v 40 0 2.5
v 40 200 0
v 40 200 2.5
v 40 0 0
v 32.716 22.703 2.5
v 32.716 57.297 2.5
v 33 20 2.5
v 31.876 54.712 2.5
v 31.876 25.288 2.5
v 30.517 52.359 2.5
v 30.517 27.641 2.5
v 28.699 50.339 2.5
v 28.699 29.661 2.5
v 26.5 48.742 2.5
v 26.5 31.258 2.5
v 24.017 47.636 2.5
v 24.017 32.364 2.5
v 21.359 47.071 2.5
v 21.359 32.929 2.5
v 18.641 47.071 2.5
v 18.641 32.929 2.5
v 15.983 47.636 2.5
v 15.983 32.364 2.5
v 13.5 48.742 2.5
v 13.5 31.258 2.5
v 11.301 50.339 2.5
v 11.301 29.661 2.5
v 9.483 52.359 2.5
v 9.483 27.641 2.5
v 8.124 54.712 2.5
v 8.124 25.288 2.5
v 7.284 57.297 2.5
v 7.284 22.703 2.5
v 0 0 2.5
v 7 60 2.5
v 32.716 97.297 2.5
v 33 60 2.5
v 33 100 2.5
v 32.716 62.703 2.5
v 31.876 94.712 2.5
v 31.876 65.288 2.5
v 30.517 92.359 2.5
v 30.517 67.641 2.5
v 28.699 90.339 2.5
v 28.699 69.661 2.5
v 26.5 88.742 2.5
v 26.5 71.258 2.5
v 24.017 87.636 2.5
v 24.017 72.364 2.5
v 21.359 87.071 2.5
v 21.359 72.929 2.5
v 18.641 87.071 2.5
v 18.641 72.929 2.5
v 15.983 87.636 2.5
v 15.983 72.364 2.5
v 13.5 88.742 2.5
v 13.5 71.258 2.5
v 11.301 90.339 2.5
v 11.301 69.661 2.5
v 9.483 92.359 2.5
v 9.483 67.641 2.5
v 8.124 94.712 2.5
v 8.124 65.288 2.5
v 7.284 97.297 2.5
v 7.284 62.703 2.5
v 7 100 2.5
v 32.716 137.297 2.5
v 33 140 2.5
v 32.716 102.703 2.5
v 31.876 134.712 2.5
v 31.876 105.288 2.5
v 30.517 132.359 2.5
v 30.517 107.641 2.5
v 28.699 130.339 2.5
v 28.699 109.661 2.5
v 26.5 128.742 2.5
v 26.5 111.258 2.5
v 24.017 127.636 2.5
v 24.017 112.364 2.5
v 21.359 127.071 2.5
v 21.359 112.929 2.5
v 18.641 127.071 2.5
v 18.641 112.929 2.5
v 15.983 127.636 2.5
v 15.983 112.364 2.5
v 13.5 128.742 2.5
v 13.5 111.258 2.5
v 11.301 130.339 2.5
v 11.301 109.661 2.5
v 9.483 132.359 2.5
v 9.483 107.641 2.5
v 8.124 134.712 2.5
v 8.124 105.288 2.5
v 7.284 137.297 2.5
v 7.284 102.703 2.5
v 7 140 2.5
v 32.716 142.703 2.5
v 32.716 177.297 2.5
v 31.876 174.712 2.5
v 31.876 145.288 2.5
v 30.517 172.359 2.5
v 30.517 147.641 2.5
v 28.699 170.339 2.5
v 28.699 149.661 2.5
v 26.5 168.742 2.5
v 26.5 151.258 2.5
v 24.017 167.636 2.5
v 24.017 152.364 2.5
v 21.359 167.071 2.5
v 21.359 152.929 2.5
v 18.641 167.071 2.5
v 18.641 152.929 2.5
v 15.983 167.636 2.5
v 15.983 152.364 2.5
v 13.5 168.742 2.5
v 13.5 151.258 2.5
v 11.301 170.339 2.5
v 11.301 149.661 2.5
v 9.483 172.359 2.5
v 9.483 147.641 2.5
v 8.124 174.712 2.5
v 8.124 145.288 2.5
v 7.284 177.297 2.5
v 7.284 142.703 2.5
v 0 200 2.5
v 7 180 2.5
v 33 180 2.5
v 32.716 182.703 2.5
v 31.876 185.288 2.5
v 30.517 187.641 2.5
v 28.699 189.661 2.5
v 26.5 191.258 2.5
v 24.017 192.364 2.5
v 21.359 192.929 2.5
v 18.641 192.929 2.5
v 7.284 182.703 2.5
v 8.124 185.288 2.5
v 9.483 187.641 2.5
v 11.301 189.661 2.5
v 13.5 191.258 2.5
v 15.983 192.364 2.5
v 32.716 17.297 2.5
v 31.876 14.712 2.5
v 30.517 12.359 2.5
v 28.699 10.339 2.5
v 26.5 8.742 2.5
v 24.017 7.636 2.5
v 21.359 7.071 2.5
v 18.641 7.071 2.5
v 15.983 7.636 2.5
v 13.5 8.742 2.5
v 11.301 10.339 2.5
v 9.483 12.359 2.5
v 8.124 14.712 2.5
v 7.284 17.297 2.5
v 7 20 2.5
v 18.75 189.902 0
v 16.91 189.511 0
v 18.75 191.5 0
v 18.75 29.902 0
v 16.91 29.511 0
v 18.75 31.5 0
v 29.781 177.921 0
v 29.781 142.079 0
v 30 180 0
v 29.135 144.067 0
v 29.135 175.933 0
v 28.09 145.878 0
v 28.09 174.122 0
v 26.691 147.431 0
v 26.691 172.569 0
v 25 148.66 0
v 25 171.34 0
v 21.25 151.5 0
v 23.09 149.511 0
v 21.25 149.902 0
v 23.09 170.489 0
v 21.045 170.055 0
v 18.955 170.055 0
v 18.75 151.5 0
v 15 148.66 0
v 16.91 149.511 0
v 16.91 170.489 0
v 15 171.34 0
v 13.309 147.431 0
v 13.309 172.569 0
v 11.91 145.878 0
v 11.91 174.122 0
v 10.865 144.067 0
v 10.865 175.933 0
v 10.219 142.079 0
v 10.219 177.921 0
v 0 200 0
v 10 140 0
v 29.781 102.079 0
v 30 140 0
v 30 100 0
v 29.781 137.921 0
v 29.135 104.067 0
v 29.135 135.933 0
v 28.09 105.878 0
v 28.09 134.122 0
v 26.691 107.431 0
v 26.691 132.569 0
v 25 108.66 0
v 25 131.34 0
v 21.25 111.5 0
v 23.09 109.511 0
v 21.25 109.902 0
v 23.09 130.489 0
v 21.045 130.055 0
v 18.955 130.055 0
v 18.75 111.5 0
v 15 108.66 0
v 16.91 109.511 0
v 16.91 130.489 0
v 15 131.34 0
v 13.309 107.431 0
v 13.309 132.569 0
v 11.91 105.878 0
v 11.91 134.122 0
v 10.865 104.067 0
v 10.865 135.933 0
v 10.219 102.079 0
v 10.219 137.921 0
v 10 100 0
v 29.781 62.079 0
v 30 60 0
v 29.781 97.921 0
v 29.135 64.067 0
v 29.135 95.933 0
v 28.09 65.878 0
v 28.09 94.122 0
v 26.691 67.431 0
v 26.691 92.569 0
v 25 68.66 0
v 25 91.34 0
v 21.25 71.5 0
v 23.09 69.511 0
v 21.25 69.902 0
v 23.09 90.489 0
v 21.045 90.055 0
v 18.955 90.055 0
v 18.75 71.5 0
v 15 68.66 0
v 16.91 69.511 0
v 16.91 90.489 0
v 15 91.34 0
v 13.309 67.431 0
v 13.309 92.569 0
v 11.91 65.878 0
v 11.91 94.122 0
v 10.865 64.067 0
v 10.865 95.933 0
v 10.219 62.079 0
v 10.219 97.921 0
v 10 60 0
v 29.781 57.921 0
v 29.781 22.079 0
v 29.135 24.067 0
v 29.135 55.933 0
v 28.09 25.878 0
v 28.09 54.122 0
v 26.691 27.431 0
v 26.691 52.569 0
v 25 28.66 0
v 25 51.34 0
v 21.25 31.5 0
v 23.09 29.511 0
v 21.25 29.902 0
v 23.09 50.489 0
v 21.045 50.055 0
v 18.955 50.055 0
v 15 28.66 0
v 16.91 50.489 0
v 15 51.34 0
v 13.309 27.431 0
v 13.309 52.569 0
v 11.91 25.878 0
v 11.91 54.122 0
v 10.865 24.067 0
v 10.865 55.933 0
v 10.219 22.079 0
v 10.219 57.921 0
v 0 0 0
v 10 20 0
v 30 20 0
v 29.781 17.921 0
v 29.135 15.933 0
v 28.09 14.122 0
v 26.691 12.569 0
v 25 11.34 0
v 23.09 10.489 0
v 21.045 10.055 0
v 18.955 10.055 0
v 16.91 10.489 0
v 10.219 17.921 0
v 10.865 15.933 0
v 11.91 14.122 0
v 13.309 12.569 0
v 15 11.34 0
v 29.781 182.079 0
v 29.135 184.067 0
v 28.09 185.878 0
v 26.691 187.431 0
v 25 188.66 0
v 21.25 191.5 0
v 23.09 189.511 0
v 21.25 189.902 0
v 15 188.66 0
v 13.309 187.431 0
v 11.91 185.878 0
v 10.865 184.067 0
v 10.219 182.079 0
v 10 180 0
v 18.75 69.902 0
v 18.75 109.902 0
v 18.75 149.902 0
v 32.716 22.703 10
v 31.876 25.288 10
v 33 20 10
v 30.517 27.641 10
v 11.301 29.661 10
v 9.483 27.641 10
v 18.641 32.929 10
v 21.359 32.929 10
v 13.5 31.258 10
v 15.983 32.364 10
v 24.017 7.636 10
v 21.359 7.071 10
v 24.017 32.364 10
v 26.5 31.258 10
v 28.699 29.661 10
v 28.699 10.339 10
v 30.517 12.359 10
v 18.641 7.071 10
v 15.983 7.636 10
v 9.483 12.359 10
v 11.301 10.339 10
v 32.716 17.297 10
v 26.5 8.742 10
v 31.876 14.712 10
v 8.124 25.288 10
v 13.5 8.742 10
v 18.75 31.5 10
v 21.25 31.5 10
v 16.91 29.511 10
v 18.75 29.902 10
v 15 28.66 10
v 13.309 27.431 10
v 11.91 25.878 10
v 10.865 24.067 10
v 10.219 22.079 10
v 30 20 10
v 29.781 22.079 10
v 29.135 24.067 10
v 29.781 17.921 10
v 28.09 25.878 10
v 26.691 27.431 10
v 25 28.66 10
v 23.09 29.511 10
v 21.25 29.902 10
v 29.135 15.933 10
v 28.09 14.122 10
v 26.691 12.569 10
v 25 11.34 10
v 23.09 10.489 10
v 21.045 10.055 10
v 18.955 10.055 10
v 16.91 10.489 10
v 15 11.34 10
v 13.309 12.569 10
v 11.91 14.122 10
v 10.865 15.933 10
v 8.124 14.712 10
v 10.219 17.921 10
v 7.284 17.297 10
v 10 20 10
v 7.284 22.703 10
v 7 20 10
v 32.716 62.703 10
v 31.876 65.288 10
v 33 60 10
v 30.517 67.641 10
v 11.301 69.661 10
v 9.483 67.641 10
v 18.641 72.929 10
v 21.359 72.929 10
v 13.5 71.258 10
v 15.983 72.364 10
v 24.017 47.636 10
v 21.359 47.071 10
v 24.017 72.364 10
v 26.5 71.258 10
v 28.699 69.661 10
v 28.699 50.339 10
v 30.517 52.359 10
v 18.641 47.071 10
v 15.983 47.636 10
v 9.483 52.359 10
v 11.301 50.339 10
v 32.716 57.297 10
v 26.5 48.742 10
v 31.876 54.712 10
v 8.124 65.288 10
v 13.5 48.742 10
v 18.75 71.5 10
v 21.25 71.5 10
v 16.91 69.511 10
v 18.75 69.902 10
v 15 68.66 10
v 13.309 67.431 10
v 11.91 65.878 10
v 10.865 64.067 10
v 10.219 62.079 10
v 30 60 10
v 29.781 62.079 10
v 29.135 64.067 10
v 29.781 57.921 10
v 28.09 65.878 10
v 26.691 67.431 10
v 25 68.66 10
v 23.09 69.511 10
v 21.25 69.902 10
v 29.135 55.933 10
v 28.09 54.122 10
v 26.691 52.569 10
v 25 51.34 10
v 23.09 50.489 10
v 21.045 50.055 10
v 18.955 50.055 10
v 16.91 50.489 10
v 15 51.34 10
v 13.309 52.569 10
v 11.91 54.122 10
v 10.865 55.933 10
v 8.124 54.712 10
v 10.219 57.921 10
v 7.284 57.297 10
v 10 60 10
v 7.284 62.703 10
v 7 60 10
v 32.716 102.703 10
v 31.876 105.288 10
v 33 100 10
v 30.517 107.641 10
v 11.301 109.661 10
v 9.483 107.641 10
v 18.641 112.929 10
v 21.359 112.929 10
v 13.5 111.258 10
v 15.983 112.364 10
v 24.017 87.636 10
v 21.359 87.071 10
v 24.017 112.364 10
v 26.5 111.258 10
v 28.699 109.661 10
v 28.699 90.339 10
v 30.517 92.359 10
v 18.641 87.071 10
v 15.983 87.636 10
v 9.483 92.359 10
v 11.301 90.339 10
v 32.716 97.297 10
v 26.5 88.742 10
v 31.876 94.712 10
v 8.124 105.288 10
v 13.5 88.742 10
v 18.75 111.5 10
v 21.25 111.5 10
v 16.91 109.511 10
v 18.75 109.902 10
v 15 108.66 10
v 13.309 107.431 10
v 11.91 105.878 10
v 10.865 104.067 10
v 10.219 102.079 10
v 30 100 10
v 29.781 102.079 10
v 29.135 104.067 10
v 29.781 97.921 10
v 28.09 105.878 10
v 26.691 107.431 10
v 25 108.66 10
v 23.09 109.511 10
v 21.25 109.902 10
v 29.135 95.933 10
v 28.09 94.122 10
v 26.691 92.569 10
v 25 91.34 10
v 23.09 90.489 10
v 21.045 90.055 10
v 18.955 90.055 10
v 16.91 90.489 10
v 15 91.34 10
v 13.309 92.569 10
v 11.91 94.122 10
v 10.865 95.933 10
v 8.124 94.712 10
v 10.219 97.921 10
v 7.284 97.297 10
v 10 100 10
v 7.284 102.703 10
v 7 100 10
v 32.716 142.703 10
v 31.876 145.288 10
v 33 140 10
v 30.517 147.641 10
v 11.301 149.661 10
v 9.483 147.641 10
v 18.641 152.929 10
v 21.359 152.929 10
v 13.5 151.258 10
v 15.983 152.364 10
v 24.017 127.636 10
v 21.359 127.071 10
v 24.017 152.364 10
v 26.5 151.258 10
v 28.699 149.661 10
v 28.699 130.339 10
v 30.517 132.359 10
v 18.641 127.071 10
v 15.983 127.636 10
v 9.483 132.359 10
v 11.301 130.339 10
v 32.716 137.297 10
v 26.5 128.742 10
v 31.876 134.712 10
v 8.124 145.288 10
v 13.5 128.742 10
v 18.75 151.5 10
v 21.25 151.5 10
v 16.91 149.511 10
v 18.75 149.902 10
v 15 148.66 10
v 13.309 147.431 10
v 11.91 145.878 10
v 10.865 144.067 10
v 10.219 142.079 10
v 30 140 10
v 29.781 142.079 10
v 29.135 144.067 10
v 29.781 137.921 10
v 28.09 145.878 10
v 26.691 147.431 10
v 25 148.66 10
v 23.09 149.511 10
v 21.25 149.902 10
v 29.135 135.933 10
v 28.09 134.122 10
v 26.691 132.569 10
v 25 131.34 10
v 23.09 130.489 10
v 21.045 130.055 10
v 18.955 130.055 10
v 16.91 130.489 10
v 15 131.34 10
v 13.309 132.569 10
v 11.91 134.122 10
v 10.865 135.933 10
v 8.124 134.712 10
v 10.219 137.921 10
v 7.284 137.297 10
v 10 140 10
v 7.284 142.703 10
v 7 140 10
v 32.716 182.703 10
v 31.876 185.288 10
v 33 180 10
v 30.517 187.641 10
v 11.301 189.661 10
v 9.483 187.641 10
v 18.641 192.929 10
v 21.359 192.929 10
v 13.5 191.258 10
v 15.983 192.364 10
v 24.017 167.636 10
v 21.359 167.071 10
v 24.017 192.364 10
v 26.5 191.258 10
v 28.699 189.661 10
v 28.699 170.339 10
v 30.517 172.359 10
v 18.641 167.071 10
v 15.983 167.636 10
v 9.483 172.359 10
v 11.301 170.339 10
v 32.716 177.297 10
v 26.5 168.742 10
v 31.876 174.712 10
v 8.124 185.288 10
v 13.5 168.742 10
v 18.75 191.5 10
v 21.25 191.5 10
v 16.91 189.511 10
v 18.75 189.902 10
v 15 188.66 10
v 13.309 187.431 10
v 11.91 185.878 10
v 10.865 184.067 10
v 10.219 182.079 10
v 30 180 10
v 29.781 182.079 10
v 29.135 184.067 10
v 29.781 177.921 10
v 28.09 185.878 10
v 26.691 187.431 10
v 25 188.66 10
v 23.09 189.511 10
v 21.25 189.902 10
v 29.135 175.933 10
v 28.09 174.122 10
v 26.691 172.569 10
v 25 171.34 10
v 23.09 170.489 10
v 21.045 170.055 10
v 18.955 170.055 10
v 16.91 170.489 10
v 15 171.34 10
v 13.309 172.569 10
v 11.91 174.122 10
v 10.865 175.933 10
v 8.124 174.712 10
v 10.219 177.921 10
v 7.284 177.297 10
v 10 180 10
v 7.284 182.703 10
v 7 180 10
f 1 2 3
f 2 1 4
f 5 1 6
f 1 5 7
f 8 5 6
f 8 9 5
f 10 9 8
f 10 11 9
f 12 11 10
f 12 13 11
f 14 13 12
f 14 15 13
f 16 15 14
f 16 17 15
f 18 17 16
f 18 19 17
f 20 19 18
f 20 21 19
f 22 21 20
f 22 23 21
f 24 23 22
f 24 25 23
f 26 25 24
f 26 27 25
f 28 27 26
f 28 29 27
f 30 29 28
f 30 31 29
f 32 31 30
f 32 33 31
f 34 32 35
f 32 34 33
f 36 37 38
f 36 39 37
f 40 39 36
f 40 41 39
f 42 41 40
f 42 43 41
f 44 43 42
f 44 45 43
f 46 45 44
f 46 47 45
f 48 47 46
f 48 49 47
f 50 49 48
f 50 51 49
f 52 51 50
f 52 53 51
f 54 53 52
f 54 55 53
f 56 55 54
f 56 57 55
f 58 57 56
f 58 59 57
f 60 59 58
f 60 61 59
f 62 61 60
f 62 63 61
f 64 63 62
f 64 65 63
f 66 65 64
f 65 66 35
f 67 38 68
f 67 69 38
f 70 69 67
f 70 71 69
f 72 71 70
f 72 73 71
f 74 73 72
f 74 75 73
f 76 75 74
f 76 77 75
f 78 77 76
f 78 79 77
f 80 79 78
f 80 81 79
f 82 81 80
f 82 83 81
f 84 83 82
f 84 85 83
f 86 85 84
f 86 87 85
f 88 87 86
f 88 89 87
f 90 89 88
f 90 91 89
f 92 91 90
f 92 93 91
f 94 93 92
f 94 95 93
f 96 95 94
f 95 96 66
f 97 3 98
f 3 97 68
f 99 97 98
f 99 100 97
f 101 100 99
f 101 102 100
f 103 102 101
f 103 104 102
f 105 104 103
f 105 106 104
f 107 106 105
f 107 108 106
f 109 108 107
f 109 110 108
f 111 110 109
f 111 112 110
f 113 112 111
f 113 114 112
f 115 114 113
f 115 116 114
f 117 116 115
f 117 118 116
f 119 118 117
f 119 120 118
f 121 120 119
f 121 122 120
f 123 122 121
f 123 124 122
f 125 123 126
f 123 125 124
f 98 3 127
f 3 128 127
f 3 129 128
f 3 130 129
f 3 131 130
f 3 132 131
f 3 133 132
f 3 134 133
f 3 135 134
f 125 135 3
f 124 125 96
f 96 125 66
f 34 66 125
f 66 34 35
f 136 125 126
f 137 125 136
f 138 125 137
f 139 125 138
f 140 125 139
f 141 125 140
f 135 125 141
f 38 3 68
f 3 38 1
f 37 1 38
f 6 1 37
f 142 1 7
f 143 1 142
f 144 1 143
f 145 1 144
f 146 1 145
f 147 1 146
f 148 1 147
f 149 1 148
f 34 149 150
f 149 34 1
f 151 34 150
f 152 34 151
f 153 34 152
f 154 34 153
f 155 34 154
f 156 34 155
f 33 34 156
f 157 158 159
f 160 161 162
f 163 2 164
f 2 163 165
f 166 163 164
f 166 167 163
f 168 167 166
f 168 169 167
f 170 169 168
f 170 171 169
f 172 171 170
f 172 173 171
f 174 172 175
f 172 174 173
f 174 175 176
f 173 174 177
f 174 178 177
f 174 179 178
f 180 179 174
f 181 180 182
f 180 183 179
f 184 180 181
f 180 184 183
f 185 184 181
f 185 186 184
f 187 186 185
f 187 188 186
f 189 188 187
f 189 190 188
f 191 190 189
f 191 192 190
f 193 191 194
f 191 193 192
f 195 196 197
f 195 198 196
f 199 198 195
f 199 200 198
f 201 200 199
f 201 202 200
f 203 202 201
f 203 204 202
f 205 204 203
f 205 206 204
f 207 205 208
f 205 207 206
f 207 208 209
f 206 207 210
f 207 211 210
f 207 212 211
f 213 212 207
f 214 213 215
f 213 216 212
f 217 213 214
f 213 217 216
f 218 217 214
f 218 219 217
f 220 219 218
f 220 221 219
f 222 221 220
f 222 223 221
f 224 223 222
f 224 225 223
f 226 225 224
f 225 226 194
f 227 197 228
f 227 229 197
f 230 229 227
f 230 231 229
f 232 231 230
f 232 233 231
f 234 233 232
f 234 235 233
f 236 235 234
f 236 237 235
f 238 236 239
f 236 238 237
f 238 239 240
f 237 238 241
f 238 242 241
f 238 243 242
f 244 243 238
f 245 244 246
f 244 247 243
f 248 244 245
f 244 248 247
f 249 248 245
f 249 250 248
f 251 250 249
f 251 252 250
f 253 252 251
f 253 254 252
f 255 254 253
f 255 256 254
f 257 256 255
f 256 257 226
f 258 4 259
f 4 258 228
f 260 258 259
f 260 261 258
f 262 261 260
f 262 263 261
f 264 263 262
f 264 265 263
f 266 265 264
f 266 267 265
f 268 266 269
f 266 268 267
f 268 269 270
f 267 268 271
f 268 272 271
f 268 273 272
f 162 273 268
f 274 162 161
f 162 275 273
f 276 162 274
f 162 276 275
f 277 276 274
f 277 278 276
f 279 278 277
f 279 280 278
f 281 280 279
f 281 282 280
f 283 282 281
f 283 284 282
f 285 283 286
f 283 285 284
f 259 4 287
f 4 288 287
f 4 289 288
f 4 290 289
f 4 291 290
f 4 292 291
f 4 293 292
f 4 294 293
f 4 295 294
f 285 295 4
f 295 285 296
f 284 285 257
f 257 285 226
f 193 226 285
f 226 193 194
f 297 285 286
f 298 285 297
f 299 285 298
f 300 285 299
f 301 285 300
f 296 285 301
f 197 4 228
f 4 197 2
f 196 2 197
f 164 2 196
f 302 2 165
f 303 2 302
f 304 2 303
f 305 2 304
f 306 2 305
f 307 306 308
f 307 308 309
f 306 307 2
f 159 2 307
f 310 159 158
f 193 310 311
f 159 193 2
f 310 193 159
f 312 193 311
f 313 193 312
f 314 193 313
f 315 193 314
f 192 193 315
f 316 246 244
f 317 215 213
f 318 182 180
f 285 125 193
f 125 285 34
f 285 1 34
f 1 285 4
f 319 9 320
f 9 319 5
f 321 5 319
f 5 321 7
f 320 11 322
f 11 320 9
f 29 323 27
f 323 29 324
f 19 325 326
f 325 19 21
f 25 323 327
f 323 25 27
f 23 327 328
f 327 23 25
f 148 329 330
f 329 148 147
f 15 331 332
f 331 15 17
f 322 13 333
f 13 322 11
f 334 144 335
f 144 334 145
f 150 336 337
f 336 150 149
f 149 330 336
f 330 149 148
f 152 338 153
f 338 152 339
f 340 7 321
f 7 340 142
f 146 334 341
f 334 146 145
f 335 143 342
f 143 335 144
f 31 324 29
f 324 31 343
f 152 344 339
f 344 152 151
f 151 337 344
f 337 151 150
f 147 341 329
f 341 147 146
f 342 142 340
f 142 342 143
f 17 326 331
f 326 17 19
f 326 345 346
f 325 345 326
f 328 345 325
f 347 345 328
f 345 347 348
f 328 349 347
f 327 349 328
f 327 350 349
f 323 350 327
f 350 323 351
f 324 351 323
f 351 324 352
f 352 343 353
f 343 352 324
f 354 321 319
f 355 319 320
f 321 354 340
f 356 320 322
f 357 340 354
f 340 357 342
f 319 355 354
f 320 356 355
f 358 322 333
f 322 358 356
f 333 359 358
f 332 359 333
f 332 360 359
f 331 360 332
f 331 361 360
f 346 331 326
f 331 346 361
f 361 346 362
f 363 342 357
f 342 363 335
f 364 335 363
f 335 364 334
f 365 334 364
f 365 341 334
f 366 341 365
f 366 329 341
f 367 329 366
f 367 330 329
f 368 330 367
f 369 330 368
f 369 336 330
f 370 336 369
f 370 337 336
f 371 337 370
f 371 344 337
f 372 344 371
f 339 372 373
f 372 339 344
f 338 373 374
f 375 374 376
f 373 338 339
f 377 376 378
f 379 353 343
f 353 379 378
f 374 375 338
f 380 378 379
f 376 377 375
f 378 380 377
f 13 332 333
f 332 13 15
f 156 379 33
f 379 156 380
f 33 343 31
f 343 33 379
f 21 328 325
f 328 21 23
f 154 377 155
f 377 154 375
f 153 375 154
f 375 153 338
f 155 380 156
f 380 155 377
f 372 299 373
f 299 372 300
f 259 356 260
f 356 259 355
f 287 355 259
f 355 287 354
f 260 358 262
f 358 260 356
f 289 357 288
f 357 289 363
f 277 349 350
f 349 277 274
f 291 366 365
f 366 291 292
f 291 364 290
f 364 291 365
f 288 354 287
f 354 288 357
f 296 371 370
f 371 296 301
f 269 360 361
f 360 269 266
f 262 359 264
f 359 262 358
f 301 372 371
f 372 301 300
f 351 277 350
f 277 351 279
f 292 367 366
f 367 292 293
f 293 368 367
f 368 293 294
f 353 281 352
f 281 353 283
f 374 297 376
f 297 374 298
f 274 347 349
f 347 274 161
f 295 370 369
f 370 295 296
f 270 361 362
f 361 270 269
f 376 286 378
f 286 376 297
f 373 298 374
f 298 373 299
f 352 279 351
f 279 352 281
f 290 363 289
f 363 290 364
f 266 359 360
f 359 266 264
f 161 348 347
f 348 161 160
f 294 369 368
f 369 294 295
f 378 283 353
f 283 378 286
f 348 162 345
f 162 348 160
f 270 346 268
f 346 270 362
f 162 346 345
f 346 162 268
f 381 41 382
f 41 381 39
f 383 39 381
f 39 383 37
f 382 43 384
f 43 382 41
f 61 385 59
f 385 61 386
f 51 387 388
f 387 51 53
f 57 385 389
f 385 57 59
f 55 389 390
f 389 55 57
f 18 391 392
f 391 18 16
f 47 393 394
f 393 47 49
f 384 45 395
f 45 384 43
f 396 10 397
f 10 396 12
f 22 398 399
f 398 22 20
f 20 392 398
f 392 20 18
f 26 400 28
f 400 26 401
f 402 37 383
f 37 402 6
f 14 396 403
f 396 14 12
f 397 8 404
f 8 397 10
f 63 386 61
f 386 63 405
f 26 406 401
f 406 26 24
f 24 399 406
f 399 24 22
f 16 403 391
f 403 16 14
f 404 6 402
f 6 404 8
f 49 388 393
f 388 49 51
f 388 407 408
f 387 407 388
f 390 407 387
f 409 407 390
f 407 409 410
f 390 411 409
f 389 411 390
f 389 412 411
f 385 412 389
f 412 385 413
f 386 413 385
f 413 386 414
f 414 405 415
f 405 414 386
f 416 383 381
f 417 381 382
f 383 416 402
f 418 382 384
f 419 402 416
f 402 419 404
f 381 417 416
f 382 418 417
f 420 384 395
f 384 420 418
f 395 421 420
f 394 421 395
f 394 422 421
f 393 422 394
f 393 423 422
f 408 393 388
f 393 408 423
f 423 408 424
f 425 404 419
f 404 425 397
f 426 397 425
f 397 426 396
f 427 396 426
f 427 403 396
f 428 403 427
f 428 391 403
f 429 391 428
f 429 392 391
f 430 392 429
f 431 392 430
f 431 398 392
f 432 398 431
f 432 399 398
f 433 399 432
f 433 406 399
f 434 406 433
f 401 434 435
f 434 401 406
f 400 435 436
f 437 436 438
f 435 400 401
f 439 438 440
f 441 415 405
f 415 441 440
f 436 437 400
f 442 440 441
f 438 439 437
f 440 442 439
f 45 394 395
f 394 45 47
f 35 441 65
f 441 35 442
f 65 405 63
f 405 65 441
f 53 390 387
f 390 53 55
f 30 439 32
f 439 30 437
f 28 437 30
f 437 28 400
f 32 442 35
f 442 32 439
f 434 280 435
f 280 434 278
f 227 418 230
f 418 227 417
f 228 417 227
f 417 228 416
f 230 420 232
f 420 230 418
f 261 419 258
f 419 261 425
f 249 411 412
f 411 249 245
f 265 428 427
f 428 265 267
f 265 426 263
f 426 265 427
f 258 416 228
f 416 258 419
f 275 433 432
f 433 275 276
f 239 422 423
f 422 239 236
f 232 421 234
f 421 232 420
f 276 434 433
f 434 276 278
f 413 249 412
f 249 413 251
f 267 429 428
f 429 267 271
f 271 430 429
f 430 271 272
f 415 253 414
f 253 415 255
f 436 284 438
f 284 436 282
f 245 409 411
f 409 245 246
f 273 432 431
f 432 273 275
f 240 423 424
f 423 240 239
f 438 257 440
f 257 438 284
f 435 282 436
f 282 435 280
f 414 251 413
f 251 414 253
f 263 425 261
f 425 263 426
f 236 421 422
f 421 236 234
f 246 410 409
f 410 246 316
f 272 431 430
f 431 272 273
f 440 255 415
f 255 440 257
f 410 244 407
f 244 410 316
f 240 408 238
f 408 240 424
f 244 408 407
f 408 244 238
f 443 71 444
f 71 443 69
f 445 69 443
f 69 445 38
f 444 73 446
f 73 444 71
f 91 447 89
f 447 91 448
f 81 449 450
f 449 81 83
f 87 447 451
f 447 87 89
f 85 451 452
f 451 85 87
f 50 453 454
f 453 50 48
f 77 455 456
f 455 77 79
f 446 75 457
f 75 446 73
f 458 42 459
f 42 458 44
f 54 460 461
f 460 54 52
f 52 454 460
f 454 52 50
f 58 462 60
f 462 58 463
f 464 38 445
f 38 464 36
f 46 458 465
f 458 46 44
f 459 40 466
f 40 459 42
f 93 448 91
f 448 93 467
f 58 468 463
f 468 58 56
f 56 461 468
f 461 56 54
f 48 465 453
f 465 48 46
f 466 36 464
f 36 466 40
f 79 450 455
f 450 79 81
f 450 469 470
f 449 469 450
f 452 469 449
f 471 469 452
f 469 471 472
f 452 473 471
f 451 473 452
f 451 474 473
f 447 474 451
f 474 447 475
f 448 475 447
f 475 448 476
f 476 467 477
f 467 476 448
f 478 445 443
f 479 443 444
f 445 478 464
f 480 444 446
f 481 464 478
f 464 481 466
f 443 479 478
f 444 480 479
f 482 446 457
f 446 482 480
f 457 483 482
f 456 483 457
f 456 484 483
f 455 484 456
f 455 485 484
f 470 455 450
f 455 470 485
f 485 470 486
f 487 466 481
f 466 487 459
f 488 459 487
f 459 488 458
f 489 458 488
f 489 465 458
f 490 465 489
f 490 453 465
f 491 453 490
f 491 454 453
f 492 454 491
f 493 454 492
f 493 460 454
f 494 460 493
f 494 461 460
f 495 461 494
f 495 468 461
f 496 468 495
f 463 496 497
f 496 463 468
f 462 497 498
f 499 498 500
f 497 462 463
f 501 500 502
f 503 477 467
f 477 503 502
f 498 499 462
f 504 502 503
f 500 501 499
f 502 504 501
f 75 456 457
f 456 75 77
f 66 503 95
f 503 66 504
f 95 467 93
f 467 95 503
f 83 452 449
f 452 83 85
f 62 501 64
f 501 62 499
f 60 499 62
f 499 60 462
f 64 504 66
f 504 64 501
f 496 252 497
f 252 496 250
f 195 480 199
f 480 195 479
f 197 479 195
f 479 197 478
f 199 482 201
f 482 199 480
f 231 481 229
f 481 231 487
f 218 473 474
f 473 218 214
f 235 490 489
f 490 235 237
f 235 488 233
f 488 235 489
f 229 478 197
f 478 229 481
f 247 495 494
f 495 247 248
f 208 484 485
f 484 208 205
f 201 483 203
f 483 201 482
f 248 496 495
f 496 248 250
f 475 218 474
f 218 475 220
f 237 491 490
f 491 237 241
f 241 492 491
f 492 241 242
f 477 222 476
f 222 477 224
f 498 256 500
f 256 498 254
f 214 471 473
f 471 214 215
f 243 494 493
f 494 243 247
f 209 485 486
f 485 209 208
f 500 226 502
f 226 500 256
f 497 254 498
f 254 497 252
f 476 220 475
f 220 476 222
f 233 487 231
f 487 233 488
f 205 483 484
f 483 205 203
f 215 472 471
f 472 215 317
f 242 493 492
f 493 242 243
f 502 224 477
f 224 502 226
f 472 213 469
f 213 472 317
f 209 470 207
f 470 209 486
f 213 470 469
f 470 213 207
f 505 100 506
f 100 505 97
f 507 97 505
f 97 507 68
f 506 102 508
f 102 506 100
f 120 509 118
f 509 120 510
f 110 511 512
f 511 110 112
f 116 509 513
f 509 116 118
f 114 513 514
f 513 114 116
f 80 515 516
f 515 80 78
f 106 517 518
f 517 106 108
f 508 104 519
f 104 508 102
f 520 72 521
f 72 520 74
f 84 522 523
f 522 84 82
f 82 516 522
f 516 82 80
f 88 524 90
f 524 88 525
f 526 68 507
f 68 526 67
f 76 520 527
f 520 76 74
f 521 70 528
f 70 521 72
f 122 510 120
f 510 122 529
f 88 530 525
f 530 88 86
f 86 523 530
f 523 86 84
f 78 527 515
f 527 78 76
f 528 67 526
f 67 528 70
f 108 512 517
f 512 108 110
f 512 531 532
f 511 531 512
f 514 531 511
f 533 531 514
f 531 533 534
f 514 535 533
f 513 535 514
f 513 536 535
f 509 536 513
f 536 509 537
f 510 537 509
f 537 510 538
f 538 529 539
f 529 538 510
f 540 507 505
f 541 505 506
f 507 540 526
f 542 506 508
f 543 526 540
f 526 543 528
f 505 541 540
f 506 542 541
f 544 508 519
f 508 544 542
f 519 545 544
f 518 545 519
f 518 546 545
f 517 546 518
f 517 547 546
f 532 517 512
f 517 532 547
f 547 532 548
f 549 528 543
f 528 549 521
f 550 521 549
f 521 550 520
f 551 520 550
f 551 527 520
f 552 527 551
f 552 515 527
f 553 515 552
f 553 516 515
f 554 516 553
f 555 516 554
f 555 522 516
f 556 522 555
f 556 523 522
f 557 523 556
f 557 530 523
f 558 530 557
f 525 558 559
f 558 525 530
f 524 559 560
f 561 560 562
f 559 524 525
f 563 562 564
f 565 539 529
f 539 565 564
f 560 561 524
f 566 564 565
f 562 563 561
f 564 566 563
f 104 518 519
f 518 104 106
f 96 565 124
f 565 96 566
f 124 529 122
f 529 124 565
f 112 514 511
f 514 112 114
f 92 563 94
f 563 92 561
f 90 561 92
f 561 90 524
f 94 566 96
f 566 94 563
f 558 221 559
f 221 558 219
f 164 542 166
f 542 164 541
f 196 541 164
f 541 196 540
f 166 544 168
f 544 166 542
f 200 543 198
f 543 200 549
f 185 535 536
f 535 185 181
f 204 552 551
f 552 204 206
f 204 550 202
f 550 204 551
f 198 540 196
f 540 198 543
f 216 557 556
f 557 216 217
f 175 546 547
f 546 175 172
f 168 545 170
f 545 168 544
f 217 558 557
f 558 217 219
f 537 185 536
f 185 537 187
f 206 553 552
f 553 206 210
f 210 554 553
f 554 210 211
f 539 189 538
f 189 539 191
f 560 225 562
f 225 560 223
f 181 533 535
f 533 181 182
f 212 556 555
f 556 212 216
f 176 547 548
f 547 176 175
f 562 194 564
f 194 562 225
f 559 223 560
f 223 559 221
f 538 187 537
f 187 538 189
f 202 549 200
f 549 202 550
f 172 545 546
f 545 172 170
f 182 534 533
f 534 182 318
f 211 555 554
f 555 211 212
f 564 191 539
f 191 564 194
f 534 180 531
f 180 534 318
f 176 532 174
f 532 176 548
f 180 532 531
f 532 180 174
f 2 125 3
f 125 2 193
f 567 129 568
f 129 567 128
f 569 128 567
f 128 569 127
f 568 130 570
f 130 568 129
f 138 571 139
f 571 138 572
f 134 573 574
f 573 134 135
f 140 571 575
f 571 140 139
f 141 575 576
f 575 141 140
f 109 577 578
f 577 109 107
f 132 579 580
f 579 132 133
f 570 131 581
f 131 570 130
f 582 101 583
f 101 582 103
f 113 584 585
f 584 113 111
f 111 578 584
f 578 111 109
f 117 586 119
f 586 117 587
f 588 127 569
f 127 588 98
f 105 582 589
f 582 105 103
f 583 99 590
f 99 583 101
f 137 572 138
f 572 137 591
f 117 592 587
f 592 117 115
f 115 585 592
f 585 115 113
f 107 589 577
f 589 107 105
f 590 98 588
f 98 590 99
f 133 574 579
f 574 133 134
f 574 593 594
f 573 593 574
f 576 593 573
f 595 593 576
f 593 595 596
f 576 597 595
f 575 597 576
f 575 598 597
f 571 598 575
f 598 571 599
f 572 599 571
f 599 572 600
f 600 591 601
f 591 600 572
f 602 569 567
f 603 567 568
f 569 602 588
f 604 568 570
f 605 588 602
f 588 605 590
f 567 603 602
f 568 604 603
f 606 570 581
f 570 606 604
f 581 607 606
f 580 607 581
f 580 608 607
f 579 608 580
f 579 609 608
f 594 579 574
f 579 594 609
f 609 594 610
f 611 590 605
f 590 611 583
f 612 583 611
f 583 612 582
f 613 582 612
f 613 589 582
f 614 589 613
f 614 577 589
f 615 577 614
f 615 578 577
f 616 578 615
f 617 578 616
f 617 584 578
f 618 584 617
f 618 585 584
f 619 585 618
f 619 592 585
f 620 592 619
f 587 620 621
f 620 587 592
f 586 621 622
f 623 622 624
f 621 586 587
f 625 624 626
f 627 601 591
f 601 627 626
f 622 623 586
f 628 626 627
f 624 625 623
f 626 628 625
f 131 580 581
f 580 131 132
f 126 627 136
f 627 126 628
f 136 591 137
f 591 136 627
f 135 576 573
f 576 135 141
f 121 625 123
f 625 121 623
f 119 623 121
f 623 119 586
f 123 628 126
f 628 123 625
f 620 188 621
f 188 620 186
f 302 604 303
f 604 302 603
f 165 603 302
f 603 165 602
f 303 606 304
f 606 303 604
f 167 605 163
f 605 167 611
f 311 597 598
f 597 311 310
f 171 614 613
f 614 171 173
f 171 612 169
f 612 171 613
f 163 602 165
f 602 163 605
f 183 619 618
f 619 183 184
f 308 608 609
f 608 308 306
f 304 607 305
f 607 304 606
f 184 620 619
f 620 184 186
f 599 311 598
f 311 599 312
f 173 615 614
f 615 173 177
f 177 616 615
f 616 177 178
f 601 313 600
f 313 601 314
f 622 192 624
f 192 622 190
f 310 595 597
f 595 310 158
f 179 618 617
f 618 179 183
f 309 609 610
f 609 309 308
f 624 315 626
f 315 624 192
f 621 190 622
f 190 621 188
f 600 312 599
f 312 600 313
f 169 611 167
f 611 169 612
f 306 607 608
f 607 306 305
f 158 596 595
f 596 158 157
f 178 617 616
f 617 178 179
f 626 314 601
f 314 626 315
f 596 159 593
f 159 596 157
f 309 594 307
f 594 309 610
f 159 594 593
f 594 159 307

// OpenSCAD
switch_base_x_y = 40;

union() {
  for(a = [0:4]) {
    translate([0,a * switch_base_x_y,0]) {
      difference() {
        union() {
          cube([switch_base_x_y,switch_base_x_y,2.5]);

          translate([switch_base_x_y/2,switch_base_x_y/2,0])
            cylinder(10,13,13);
        }

        translate([switch_base_x_y/2,switch_base_x_y/2,0]) {
          translate([0,0,-1])
            cylinder(12,10,10);

          rotate(90)
            translate([10+1.5-2,-2.5/2,-1])
              cube([2,2.5,12]);
        }
      }
    }
  }
}
